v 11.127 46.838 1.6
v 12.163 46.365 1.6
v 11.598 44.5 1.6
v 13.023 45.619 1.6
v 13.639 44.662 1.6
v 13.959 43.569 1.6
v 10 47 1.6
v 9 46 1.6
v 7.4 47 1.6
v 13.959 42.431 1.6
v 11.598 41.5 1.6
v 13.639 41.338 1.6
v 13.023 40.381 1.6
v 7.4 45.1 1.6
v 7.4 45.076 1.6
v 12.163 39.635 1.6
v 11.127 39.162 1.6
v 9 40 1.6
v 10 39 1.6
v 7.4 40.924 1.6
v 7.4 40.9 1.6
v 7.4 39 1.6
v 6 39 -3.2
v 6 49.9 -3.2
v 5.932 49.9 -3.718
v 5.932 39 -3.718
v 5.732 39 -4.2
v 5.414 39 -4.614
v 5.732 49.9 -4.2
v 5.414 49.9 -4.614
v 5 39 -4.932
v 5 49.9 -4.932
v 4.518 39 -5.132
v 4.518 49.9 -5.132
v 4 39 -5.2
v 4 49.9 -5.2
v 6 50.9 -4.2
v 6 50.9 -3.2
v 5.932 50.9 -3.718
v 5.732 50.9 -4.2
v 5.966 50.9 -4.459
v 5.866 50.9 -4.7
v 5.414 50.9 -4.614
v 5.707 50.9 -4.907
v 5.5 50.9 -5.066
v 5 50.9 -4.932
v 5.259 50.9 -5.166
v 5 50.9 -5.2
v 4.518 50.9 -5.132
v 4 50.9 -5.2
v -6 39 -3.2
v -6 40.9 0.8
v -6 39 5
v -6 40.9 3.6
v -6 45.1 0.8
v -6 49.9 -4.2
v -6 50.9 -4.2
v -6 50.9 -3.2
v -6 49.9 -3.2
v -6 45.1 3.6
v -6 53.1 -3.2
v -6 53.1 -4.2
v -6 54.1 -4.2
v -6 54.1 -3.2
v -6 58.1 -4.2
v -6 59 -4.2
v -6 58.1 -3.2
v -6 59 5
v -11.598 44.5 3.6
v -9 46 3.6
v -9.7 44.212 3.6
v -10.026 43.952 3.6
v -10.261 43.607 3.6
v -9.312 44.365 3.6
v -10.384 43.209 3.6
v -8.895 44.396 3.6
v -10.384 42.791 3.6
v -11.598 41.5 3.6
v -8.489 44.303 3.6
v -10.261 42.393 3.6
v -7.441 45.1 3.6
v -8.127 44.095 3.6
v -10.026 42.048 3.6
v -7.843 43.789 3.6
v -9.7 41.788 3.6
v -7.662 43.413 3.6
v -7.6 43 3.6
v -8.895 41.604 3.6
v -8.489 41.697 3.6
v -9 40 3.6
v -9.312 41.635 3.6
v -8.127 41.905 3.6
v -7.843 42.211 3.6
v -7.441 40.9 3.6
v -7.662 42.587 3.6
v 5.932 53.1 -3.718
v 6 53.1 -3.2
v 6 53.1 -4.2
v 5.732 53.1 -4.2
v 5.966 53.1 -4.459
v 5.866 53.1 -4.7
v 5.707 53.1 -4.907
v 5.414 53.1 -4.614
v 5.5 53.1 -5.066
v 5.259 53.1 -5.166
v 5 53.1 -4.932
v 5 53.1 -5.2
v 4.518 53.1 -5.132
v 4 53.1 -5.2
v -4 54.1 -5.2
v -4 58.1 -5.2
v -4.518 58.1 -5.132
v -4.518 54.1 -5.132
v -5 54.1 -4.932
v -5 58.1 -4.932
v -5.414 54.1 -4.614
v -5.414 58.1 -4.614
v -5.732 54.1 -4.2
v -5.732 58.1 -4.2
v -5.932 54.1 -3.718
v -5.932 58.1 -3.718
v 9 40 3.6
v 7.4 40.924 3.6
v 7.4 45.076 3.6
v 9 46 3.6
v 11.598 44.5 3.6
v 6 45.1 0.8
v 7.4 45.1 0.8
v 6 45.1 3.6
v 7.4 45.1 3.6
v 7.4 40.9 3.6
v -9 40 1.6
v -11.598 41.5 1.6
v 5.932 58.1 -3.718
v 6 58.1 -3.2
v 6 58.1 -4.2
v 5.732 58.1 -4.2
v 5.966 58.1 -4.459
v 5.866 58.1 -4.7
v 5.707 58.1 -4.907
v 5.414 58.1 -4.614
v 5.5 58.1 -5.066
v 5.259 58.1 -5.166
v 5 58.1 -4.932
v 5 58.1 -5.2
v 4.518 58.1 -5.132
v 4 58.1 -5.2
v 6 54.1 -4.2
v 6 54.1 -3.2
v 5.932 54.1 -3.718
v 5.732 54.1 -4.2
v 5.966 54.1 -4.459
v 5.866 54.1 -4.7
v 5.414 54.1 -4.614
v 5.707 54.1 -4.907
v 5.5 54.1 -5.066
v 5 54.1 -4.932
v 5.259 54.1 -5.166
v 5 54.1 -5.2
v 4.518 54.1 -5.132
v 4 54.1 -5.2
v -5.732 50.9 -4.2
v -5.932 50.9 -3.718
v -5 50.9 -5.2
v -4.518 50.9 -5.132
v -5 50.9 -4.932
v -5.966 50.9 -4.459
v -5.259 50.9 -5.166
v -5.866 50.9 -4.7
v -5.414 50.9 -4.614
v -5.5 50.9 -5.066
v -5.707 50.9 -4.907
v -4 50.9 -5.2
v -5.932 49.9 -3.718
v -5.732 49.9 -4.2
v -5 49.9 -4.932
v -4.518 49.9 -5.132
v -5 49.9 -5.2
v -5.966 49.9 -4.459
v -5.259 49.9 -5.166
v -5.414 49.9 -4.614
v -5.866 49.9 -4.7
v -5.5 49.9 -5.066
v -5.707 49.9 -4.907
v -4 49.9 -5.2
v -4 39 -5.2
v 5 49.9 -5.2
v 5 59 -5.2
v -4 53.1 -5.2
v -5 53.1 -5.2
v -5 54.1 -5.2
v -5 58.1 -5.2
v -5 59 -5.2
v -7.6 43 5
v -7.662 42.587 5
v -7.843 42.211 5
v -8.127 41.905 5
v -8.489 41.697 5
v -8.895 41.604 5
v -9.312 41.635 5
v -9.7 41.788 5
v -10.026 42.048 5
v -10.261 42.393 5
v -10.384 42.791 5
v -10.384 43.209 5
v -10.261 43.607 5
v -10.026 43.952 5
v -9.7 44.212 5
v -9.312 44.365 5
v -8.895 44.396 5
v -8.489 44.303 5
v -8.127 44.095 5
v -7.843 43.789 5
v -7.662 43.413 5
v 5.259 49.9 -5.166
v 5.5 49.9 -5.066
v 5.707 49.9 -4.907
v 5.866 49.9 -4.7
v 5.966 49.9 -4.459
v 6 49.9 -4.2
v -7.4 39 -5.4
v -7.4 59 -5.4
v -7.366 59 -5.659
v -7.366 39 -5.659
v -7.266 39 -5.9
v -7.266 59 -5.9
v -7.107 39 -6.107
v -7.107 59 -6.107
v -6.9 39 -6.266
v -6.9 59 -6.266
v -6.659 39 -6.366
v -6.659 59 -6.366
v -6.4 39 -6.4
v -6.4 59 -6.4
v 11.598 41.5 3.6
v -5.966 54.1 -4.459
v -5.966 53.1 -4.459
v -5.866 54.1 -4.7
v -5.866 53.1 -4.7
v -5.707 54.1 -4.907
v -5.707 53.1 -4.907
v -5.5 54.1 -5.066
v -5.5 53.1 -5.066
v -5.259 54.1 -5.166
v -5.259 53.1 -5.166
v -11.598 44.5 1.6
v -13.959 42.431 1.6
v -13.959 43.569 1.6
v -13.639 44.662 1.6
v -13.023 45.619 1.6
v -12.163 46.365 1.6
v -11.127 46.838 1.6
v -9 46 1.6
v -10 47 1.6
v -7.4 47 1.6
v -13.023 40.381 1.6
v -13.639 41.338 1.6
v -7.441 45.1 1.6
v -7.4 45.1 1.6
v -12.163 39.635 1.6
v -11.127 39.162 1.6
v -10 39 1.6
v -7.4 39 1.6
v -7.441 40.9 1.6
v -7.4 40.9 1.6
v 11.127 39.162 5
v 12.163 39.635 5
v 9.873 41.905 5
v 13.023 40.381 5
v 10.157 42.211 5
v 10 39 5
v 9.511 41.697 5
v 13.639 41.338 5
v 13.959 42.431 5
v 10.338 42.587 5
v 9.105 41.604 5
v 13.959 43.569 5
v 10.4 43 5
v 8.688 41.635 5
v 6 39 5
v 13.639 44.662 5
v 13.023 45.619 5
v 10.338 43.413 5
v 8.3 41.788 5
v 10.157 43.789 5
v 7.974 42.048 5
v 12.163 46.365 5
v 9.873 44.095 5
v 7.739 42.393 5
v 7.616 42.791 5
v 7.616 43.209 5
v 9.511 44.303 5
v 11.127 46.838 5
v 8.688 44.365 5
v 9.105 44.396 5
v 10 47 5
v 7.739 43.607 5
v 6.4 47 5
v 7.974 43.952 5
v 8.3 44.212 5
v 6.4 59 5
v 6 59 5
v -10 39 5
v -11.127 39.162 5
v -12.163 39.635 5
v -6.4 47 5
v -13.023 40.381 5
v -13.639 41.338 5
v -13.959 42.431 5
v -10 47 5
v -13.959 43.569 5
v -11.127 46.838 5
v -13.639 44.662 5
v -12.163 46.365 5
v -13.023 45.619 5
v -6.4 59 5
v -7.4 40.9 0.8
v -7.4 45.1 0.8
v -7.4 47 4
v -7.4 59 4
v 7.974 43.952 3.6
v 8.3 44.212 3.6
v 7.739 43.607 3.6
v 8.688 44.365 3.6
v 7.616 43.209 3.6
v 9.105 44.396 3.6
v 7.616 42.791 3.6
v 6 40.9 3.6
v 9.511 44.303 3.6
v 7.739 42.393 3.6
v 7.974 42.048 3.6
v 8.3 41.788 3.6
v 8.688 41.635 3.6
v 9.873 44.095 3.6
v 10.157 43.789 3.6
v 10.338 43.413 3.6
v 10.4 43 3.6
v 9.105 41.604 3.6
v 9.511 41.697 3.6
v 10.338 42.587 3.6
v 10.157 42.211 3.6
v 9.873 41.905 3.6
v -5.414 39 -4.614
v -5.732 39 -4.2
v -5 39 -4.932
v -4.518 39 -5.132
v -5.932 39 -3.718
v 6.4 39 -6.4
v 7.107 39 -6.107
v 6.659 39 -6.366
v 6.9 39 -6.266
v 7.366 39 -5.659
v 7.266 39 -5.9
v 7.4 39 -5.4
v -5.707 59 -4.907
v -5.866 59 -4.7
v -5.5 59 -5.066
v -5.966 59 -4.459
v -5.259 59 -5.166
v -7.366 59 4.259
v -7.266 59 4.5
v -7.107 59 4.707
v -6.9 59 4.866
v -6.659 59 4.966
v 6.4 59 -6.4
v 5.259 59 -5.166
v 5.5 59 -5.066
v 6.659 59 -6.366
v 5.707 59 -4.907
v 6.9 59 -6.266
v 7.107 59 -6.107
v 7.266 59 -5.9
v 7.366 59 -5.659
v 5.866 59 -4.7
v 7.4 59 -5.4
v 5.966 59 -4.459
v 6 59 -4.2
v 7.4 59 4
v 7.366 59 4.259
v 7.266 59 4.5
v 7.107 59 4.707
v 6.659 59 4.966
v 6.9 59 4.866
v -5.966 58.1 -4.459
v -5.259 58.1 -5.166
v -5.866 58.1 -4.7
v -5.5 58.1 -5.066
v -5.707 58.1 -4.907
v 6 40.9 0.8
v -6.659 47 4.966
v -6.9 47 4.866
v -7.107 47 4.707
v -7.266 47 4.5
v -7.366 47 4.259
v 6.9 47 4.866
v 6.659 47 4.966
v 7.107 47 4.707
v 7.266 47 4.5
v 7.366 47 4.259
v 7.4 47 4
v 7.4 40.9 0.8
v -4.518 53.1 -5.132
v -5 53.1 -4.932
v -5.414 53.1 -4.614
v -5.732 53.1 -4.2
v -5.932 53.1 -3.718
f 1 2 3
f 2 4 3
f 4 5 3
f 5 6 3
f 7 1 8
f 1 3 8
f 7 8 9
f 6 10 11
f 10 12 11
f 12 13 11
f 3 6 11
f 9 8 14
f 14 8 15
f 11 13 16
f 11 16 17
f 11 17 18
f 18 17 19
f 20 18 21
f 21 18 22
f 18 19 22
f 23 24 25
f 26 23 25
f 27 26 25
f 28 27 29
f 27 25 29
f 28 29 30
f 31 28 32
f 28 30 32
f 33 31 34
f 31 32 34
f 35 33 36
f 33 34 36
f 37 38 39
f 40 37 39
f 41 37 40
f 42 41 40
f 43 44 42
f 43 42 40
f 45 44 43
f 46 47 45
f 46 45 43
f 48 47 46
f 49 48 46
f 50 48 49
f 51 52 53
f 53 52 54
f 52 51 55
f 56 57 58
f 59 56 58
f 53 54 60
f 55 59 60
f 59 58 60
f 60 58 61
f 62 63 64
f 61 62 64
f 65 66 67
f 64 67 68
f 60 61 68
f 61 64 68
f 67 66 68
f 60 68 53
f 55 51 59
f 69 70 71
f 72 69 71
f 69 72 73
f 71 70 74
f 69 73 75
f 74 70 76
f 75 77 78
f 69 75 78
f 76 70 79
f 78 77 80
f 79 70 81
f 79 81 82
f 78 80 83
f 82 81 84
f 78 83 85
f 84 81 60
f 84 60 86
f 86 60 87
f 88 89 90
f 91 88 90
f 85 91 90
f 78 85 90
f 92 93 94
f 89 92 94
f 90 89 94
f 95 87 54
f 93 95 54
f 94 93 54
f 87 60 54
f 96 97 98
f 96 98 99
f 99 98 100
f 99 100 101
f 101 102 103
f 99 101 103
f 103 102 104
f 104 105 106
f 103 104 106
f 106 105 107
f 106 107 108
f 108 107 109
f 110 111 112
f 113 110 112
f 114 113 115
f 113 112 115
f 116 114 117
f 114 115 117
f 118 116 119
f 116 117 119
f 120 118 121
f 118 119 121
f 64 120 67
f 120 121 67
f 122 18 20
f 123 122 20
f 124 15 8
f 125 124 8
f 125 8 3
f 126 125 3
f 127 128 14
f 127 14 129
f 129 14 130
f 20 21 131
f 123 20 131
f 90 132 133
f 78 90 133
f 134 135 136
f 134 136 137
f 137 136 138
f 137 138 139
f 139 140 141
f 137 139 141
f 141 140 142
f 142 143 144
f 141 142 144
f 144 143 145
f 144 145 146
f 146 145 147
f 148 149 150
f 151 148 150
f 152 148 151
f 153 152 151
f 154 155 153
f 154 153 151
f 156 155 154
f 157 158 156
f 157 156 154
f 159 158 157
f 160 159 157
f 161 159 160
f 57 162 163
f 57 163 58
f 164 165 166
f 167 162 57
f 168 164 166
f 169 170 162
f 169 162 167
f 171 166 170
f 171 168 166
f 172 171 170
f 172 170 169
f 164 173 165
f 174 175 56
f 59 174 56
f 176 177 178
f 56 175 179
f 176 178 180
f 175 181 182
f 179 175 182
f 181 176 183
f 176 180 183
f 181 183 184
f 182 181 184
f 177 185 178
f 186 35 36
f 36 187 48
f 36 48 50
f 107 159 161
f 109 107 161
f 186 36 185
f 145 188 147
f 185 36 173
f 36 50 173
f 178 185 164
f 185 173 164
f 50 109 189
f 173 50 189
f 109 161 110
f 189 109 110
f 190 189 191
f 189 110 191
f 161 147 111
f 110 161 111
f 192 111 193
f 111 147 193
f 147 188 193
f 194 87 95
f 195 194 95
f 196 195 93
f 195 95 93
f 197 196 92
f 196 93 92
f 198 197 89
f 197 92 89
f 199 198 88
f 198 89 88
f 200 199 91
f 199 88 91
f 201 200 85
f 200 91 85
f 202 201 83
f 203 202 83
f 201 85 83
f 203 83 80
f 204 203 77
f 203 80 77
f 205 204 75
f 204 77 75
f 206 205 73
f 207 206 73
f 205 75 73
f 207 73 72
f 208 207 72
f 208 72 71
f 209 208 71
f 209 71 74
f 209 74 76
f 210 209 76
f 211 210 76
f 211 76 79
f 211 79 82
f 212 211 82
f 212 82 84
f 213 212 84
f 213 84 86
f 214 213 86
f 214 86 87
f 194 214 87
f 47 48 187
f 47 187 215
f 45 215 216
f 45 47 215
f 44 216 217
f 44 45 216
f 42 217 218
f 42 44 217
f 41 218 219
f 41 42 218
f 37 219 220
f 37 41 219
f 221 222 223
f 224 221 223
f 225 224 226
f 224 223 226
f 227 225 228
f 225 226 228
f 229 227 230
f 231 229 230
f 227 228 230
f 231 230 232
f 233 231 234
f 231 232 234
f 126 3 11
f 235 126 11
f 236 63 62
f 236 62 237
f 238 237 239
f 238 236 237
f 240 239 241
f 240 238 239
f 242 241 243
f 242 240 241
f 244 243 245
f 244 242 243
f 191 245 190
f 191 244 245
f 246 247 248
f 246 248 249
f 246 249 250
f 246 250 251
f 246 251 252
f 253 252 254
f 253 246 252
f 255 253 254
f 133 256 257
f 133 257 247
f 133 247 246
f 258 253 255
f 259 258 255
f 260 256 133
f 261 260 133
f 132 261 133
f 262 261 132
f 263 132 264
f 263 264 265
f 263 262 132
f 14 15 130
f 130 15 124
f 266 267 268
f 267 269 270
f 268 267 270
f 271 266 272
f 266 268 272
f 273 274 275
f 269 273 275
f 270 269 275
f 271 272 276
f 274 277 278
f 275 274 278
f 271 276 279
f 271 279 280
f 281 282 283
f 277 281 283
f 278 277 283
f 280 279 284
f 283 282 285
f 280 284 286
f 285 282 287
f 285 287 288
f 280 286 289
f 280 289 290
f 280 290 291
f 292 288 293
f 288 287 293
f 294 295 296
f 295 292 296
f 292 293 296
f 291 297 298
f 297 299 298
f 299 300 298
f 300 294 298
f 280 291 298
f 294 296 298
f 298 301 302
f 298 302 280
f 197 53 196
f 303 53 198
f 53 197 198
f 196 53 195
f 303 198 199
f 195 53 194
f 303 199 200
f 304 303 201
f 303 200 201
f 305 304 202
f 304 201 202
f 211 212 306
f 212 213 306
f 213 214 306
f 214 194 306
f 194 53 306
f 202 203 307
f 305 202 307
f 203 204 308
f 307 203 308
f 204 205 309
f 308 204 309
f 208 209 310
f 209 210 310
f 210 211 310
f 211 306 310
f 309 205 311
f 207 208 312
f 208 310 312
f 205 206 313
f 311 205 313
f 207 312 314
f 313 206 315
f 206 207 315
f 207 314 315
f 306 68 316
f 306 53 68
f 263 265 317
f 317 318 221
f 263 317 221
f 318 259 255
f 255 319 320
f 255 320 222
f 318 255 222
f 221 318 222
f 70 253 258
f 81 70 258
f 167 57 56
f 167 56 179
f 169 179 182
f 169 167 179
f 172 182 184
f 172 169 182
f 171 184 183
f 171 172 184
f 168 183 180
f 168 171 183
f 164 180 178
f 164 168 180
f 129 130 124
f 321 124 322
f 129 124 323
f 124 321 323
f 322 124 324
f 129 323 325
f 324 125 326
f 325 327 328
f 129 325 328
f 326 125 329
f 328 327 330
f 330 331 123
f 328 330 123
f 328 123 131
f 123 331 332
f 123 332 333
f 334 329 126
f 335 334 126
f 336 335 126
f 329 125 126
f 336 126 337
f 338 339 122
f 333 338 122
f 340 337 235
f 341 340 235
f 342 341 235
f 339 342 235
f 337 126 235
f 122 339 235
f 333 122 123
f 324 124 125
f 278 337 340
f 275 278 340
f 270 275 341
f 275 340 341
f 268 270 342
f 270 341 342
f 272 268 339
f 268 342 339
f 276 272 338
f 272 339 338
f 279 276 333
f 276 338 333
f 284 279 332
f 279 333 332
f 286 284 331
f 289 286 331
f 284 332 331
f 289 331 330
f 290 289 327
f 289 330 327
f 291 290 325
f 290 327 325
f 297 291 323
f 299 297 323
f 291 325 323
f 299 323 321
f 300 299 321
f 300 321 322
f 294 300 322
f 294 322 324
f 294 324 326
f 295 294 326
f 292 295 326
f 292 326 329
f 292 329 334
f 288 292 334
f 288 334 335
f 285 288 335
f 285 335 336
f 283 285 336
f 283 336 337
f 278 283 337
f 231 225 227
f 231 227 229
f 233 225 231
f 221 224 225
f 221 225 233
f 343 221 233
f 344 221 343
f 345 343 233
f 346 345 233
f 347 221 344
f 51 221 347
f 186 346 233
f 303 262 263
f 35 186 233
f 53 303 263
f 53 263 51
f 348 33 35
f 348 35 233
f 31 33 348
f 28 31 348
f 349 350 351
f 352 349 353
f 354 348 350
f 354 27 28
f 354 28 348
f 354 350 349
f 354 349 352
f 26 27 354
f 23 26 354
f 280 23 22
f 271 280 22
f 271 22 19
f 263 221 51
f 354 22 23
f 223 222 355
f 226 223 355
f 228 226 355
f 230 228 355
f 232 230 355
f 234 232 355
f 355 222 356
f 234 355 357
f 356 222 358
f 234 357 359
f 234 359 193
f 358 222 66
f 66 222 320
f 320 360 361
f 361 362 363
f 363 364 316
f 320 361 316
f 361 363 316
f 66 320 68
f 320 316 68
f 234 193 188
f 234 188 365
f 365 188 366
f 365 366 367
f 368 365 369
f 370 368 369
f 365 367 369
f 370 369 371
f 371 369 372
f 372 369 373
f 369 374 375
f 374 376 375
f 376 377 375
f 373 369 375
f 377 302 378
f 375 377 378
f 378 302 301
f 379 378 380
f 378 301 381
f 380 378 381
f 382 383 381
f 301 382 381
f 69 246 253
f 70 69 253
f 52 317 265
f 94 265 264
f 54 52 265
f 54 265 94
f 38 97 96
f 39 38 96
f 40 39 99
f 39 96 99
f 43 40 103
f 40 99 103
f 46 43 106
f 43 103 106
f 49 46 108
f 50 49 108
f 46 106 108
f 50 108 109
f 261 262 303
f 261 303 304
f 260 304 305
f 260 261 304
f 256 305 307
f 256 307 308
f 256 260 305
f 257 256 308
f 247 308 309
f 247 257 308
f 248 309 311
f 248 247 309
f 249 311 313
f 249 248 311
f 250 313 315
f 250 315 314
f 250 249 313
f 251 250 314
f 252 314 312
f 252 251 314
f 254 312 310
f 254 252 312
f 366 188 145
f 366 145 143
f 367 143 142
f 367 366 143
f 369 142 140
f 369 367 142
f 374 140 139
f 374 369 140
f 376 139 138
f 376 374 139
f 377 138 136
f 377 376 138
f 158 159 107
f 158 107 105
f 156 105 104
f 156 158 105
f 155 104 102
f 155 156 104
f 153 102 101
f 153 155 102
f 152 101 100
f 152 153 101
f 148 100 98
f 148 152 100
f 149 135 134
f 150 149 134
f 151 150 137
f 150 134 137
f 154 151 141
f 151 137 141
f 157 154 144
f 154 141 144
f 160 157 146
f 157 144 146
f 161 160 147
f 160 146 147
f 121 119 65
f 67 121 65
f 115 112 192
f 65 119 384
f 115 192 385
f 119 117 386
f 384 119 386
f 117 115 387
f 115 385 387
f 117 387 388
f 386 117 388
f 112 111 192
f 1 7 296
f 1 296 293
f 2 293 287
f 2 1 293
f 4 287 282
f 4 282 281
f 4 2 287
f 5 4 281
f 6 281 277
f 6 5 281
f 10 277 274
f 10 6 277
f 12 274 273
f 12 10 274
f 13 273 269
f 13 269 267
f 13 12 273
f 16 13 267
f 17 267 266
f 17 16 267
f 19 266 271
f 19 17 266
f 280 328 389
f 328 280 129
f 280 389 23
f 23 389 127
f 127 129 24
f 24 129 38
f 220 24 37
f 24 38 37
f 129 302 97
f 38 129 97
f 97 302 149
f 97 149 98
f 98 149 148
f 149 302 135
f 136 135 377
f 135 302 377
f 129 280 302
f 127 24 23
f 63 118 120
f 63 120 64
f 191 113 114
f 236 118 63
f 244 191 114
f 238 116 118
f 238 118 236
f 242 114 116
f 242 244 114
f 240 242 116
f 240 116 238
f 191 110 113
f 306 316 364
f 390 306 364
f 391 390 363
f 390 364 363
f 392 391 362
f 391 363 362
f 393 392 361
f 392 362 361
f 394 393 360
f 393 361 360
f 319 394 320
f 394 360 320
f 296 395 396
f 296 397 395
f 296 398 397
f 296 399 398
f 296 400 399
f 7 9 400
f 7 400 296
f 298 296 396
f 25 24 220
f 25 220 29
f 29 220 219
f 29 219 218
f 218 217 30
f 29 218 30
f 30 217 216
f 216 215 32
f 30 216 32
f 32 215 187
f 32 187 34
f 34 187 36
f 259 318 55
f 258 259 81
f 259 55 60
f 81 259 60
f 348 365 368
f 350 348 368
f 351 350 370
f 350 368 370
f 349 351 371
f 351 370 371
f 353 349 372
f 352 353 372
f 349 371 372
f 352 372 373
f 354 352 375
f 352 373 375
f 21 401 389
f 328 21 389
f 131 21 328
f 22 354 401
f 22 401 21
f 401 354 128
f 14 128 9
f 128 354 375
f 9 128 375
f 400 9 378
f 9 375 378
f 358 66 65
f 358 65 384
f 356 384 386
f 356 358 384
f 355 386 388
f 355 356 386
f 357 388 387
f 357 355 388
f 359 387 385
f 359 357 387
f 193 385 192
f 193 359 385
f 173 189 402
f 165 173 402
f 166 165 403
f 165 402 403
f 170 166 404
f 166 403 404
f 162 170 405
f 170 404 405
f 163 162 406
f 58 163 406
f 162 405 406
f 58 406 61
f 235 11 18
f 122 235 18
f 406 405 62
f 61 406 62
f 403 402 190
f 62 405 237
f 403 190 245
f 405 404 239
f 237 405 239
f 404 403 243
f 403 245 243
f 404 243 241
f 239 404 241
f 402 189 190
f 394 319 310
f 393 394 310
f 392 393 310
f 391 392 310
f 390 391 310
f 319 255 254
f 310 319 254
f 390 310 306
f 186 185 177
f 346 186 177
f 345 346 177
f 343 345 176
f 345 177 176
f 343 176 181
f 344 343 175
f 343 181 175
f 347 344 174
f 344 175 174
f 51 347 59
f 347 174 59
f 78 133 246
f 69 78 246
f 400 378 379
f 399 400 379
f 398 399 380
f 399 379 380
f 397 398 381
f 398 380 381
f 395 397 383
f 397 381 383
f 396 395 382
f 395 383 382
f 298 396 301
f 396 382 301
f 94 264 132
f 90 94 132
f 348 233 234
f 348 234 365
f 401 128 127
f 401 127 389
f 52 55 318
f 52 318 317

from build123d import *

# Parameters (mm, degrees)
PAD006_DEPTH    = 20
SKETCH009_W     = 12.4
SKETCH009_H     = 4
SKETCH009_H_2   = 2.2
SKETCH009_H_3   = 10.9
PAD007_DEPTH    = 10.2
POCKET002_DEPTH = 19.101
PAD008_START    = -8
PAD008_DEPTH    = 3.4
POCKET003_DEPTH = 2
SKETCH013_R     = 1.4
POCKET004_DEPTH = 1.401
SKETCH015_W     = 2.8
SKETCH015_H     = 4.2
POCKET005_DEPTH = 16


with BuildPart() as part:
    # Sketch008 → Pad006 (new body)
    with BuildSketch(Plane.XZ):
        with BuildLine():
            Line((6.4, 5), (6, 5))
            Line((6, -4.2), (6, 5))
            ThreePointArc((5, -5.2), (5.707107, -4.907107), (6, -4.2))
            Line((-5, -5.2), (5, -5.2))
            ThreePointArc((-6, -4.2), (-5.707107, -4.907107), (-5, -5.2))
            Line((-6, 5), (-6, -4.2))
            Line((-6, 5), (-6.4, 5))
            ThreePointArc((-6.4, 5), (-7.107107, 4.707107), (-7.4, 4))
            Line((-7.4, 4), (-7.4, -5.4))
            ThreePointArc((-7.4, -5.4), (-7.107107, -6.107107), (-6.4, -6.4))
            Line((-6.4, -6.4), (6.4, -6.4))
            ThreePointArc((6.4, -6.4), (7.107107, -6.107107), (7.4, -5.4))
            Line((7.4, -5.4), (7.4, 4))
            ThreePointArc((7.4, 4), (7.107107, 4.707107), (6.4, 5))
        make_face()
    extrude(amount=PAD006_DEPTH)

    # Sketch009 (on Face12 of Pad006) → Pad007 (join)
    with BuildSketch(Plane(origin=(0, 0, -5.2), x_dir=(-1, 0, 0), z_dir=(0, 0, 1))):
        with Locations((0, 2.9)):
            Rectangle(SKETCH009_W, SKETCH009_H)
        with Locations((0, 7)):
            Rectangle(SKETCH009_W, SKETCH009_H_2)
        with Locations((0, 14.55)):
            Rectangle(SKETCH009_W, SKETCH009_H_3)
    extrude(amount=PAD007_DEPTH)

    # Sketch010 (on Face14 of Pad007) → Pocket002 (cut, through all)
    with BuildSketch(Plane(origin=(0, -0.9, 0), x_dir=(1, 0, 0), z_dir=(0, 1, 0))):
        with BuildLine():
            Line((-4, -7.8), (4, -7.8))
            ThreePointArc((4, -7.8), (5.414214, -7.214214), (6, -5.8))
            Line((6, -5.8), (6, 3.2))
            ThreePointArc((6, 3.2), (5.414214, 4.614214), (4, 5.2))
            Line((4, 5.2), (-4, 5.2))
            ThreePointArc((-4, 5.2), (-5.414214, 4.614214), (-6, 3.2))
            Line((-6, 3.2), (-6, -5.8))
            ThreePointArc((-6, -5.8), (-5.414214, -7.214214), (-4, -7.8))
        make_face()
    extrude(amount=-POCKET002_DEPTH, mode=Mode.SUBTRACT)

    # Sketch011 (on Face6 of Pocket002) → Pad008 (join)
    with BuildSketch(Plane(origin=(0, 0, -6.4), x_dir=(1, 0, 0), z_dir=(0, 0, -1)).offset(PAD008_START)):
        with BuildLine():
            Line((-6, 20), (-10, 20))
            ThreePointArc((-10, 20), (-14, 16), (-10, 12))
            Line((-6, 12), (-10, 12))
            Line((-6, 20), (-6, 12))
        make_face()
        with BuildLine():
            Line((6, 20), (10, 20))
            ThreePointArc((10, 12), (14, 16), (10, 20))
            Line((6, 12), (10, 12))
            Line((6, 20), (6, 12))
        make_face()
    extrude(amount=-PAD008_DEPTH)

    # Sketch012 (on Face15 of Pad008) → Pocket003 (cut)
    with BuildSketch(Plane(origin=(0, 0, 1.6), x_dir=(1, 0, 0), z_dir=(0, 0, -1))):
        Polygon((-6.401924, 14.5), (-6.401924, 17.5), (-9, 19), (-11.598076, 17.5), (-11.598076, 14.5), (-9, 13), align=None)
        Polygon((11.598076, 14.5), (11.598076, 17.5), (9, 19), (6.401924, 17.5), (6.401924, 14.5), (9, 13), align=None)
    extrude(amount=-POCKET003_DEPTH, mode=Mode.SUBTRACT)

    # Sketch013 (on Face57 of Pocket003) → Pocket004 (cut, through all)
    with BuildSketch(Plane(origin=(0, 0, 3.6), x_dir=(1, 0, 0), z_dir=(0, 0, -1))):
        with Locations((-9, 16)):
            Circle(SKETCH013_R)
        with Locations((9, 16)):
            Circle(SKETCH013_R)
    extrude(amount=-POCKET004_DEPTH, mode=Mode.SUBTRACT)

    # Sketch015 (on Face8 of Pocket004) → Pocket005 (cut)
    with BuildSketch(Plane(origin=(7.4, 0, 0), x_dir=(0, 0, 1), z_dir=(1, 0, 0))):
        with Locations((2.2, 16)):
            Rectangle(SKETCH015_W, SKETCH015_H)
    extrude(amount=-POCKET005_DEPTH, mode=Mode.SUBTRACT)


with BuildPart() as part_1:
    # Body002 placement: moved
    add(part.part.moved(Location((0, 59, 0))))


solid = part_1.part
